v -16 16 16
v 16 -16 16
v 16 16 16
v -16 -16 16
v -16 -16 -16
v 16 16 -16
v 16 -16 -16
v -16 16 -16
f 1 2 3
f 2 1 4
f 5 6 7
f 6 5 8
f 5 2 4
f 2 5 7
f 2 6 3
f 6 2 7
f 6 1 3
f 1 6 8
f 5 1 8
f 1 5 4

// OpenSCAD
$fn = 64;
module cube_core() { cube([32, 32, 32], center = true); }
module cylinder_clip() { cylinder(h = 40, r = 18, center = true); }
cube_core();
